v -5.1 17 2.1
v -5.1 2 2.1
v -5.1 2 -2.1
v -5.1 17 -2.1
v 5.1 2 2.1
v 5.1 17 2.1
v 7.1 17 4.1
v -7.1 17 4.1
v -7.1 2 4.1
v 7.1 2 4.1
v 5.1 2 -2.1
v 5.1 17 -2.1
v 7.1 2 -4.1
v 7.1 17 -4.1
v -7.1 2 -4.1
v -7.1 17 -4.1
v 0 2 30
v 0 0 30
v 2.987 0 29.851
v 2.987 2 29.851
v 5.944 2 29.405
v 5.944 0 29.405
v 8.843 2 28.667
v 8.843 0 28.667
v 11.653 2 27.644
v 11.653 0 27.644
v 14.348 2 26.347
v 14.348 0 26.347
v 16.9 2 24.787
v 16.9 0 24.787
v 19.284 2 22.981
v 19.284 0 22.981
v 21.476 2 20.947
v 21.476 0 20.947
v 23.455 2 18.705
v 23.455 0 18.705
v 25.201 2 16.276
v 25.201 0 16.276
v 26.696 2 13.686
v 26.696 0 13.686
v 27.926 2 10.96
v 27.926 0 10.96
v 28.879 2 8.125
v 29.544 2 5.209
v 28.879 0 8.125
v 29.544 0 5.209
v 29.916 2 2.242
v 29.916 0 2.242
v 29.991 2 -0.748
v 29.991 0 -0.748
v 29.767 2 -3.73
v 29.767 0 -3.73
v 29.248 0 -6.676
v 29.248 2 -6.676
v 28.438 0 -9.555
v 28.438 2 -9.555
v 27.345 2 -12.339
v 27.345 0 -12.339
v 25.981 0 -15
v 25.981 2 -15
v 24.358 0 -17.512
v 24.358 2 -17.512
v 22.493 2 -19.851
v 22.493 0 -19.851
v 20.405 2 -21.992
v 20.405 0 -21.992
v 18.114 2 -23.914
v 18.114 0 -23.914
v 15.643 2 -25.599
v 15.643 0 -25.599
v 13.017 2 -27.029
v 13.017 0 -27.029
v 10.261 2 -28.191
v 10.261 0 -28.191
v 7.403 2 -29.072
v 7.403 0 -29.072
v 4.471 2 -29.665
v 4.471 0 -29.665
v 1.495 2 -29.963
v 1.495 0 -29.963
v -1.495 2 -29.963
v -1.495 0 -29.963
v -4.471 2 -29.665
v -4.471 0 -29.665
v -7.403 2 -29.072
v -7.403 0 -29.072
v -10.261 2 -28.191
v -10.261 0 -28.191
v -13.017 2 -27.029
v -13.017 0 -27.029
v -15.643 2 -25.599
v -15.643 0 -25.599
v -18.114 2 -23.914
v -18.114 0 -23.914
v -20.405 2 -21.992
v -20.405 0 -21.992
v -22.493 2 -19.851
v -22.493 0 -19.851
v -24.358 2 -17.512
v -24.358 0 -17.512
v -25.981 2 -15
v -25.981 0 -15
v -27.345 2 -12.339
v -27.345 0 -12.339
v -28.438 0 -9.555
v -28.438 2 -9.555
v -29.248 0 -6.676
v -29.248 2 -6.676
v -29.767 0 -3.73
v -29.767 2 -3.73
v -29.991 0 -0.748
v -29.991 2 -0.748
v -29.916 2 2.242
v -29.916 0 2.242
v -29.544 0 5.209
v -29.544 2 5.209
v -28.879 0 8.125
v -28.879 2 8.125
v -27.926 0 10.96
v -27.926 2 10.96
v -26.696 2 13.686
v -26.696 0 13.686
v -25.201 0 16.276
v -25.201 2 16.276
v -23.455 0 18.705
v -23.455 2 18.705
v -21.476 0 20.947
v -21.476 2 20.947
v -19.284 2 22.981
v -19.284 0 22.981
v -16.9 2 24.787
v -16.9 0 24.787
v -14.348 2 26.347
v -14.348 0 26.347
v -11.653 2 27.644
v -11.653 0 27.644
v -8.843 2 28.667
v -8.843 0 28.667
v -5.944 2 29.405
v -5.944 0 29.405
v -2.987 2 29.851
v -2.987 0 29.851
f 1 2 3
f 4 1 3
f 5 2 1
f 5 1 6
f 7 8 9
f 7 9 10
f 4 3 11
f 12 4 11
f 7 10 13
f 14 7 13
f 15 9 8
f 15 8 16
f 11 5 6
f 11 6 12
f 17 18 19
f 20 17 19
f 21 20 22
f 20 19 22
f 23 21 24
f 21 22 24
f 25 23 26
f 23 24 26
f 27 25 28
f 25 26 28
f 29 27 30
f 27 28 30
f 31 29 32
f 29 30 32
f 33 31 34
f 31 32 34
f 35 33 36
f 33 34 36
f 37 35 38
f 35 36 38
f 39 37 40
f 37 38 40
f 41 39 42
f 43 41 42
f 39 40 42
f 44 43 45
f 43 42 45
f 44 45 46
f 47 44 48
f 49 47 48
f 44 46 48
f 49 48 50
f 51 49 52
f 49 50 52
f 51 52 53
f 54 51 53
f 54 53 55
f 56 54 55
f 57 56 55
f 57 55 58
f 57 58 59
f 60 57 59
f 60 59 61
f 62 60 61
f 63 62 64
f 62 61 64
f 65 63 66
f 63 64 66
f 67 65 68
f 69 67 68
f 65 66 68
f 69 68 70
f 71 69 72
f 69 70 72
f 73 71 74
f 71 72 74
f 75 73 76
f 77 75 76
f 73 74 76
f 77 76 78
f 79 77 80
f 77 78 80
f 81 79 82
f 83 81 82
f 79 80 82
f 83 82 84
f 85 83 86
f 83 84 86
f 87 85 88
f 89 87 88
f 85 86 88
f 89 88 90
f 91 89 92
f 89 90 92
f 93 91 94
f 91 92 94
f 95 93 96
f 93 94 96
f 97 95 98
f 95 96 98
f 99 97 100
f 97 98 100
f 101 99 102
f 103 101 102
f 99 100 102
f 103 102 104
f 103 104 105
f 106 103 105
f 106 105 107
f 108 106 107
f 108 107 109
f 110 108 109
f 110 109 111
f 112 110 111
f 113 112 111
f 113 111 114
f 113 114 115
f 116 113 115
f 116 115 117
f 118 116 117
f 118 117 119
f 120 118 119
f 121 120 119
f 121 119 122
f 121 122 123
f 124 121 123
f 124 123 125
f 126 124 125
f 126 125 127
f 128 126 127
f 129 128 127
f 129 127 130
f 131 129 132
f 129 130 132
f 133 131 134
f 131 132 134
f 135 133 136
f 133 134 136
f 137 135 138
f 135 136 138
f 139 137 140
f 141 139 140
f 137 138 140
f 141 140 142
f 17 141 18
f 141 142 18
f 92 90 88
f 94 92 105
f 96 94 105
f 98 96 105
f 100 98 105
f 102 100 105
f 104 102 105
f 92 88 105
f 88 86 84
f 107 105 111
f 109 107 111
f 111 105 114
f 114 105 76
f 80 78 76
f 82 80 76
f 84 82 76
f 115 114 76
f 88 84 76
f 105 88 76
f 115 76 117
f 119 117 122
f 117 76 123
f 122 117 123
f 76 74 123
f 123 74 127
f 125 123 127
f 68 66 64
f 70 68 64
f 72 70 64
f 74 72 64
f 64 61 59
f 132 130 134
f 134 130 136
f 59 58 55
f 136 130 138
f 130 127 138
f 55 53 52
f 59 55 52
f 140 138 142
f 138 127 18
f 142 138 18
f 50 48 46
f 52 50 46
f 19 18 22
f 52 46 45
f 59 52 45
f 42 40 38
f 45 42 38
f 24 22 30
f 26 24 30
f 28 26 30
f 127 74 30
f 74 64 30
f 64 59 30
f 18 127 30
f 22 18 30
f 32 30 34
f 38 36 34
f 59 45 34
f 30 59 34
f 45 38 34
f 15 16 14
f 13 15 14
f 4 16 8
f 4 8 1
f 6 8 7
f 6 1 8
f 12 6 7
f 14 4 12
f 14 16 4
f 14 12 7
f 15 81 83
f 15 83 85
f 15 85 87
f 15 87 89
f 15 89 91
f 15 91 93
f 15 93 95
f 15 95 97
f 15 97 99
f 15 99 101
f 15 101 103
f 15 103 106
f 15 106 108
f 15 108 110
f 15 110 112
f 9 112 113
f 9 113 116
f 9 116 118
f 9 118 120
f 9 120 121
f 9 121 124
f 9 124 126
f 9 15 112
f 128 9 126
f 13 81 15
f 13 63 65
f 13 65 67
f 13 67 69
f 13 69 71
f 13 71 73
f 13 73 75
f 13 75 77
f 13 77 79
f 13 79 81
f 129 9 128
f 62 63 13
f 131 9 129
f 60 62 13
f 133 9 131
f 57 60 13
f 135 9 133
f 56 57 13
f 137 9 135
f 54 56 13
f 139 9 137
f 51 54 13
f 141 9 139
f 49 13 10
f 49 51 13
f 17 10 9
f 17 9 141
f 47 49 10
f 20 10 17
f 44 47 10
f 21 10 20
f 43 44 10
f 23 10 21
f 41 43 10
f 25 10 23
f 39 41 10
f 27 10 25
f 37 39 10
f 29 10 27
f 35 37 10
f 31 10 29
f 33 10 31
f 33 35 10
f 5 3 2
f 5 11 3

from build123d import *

# Parameters (mm, degrees)
ESQUISSE1_R        = 30
BOSS_EXTRU_1_DEPTH = 2
ESQUISSE2_W        = 14.2
ESQUISSE2_H        = 8.2
ESQUISSE2_W_2      = 10.2
ESQUISSE2_H_2      = 4.2
BOSS_EXTRU_2_DEPTH = 15


with BuildPart() as part:
    # Esquisse1 → Boss.-Extru.1 (new body)
    with BuildSketch(Plane(origin=(0, 0, 0), x_dir=(1, 0, 0), z_dir=(0, 1, 0))):
        with Locations(Location((0, 0, 0), (0, 0, 270))):
            Circle(ESQUISSE1_R)
    extrude(amount=BOSS_EXTRU_1_DEPTH)

    # Esquisse2 → Boss.-Extru.2 (add)
    with BuildSketch(Plane(origin=(0, 2, 0), x_dir=(1, 0, 0), z_dir=(0, 1, 0))):
        Rectangle(ESQUISSE2_W, ESQUISSE2_H)
        Rectangle(ESQUISSE2_W_2, ESQUISSE2_H_2, mode=Mode.SUBTRACT)
    extrude(amount=BOSS_EXTRU_2_DEPTH)


solid = part.part
